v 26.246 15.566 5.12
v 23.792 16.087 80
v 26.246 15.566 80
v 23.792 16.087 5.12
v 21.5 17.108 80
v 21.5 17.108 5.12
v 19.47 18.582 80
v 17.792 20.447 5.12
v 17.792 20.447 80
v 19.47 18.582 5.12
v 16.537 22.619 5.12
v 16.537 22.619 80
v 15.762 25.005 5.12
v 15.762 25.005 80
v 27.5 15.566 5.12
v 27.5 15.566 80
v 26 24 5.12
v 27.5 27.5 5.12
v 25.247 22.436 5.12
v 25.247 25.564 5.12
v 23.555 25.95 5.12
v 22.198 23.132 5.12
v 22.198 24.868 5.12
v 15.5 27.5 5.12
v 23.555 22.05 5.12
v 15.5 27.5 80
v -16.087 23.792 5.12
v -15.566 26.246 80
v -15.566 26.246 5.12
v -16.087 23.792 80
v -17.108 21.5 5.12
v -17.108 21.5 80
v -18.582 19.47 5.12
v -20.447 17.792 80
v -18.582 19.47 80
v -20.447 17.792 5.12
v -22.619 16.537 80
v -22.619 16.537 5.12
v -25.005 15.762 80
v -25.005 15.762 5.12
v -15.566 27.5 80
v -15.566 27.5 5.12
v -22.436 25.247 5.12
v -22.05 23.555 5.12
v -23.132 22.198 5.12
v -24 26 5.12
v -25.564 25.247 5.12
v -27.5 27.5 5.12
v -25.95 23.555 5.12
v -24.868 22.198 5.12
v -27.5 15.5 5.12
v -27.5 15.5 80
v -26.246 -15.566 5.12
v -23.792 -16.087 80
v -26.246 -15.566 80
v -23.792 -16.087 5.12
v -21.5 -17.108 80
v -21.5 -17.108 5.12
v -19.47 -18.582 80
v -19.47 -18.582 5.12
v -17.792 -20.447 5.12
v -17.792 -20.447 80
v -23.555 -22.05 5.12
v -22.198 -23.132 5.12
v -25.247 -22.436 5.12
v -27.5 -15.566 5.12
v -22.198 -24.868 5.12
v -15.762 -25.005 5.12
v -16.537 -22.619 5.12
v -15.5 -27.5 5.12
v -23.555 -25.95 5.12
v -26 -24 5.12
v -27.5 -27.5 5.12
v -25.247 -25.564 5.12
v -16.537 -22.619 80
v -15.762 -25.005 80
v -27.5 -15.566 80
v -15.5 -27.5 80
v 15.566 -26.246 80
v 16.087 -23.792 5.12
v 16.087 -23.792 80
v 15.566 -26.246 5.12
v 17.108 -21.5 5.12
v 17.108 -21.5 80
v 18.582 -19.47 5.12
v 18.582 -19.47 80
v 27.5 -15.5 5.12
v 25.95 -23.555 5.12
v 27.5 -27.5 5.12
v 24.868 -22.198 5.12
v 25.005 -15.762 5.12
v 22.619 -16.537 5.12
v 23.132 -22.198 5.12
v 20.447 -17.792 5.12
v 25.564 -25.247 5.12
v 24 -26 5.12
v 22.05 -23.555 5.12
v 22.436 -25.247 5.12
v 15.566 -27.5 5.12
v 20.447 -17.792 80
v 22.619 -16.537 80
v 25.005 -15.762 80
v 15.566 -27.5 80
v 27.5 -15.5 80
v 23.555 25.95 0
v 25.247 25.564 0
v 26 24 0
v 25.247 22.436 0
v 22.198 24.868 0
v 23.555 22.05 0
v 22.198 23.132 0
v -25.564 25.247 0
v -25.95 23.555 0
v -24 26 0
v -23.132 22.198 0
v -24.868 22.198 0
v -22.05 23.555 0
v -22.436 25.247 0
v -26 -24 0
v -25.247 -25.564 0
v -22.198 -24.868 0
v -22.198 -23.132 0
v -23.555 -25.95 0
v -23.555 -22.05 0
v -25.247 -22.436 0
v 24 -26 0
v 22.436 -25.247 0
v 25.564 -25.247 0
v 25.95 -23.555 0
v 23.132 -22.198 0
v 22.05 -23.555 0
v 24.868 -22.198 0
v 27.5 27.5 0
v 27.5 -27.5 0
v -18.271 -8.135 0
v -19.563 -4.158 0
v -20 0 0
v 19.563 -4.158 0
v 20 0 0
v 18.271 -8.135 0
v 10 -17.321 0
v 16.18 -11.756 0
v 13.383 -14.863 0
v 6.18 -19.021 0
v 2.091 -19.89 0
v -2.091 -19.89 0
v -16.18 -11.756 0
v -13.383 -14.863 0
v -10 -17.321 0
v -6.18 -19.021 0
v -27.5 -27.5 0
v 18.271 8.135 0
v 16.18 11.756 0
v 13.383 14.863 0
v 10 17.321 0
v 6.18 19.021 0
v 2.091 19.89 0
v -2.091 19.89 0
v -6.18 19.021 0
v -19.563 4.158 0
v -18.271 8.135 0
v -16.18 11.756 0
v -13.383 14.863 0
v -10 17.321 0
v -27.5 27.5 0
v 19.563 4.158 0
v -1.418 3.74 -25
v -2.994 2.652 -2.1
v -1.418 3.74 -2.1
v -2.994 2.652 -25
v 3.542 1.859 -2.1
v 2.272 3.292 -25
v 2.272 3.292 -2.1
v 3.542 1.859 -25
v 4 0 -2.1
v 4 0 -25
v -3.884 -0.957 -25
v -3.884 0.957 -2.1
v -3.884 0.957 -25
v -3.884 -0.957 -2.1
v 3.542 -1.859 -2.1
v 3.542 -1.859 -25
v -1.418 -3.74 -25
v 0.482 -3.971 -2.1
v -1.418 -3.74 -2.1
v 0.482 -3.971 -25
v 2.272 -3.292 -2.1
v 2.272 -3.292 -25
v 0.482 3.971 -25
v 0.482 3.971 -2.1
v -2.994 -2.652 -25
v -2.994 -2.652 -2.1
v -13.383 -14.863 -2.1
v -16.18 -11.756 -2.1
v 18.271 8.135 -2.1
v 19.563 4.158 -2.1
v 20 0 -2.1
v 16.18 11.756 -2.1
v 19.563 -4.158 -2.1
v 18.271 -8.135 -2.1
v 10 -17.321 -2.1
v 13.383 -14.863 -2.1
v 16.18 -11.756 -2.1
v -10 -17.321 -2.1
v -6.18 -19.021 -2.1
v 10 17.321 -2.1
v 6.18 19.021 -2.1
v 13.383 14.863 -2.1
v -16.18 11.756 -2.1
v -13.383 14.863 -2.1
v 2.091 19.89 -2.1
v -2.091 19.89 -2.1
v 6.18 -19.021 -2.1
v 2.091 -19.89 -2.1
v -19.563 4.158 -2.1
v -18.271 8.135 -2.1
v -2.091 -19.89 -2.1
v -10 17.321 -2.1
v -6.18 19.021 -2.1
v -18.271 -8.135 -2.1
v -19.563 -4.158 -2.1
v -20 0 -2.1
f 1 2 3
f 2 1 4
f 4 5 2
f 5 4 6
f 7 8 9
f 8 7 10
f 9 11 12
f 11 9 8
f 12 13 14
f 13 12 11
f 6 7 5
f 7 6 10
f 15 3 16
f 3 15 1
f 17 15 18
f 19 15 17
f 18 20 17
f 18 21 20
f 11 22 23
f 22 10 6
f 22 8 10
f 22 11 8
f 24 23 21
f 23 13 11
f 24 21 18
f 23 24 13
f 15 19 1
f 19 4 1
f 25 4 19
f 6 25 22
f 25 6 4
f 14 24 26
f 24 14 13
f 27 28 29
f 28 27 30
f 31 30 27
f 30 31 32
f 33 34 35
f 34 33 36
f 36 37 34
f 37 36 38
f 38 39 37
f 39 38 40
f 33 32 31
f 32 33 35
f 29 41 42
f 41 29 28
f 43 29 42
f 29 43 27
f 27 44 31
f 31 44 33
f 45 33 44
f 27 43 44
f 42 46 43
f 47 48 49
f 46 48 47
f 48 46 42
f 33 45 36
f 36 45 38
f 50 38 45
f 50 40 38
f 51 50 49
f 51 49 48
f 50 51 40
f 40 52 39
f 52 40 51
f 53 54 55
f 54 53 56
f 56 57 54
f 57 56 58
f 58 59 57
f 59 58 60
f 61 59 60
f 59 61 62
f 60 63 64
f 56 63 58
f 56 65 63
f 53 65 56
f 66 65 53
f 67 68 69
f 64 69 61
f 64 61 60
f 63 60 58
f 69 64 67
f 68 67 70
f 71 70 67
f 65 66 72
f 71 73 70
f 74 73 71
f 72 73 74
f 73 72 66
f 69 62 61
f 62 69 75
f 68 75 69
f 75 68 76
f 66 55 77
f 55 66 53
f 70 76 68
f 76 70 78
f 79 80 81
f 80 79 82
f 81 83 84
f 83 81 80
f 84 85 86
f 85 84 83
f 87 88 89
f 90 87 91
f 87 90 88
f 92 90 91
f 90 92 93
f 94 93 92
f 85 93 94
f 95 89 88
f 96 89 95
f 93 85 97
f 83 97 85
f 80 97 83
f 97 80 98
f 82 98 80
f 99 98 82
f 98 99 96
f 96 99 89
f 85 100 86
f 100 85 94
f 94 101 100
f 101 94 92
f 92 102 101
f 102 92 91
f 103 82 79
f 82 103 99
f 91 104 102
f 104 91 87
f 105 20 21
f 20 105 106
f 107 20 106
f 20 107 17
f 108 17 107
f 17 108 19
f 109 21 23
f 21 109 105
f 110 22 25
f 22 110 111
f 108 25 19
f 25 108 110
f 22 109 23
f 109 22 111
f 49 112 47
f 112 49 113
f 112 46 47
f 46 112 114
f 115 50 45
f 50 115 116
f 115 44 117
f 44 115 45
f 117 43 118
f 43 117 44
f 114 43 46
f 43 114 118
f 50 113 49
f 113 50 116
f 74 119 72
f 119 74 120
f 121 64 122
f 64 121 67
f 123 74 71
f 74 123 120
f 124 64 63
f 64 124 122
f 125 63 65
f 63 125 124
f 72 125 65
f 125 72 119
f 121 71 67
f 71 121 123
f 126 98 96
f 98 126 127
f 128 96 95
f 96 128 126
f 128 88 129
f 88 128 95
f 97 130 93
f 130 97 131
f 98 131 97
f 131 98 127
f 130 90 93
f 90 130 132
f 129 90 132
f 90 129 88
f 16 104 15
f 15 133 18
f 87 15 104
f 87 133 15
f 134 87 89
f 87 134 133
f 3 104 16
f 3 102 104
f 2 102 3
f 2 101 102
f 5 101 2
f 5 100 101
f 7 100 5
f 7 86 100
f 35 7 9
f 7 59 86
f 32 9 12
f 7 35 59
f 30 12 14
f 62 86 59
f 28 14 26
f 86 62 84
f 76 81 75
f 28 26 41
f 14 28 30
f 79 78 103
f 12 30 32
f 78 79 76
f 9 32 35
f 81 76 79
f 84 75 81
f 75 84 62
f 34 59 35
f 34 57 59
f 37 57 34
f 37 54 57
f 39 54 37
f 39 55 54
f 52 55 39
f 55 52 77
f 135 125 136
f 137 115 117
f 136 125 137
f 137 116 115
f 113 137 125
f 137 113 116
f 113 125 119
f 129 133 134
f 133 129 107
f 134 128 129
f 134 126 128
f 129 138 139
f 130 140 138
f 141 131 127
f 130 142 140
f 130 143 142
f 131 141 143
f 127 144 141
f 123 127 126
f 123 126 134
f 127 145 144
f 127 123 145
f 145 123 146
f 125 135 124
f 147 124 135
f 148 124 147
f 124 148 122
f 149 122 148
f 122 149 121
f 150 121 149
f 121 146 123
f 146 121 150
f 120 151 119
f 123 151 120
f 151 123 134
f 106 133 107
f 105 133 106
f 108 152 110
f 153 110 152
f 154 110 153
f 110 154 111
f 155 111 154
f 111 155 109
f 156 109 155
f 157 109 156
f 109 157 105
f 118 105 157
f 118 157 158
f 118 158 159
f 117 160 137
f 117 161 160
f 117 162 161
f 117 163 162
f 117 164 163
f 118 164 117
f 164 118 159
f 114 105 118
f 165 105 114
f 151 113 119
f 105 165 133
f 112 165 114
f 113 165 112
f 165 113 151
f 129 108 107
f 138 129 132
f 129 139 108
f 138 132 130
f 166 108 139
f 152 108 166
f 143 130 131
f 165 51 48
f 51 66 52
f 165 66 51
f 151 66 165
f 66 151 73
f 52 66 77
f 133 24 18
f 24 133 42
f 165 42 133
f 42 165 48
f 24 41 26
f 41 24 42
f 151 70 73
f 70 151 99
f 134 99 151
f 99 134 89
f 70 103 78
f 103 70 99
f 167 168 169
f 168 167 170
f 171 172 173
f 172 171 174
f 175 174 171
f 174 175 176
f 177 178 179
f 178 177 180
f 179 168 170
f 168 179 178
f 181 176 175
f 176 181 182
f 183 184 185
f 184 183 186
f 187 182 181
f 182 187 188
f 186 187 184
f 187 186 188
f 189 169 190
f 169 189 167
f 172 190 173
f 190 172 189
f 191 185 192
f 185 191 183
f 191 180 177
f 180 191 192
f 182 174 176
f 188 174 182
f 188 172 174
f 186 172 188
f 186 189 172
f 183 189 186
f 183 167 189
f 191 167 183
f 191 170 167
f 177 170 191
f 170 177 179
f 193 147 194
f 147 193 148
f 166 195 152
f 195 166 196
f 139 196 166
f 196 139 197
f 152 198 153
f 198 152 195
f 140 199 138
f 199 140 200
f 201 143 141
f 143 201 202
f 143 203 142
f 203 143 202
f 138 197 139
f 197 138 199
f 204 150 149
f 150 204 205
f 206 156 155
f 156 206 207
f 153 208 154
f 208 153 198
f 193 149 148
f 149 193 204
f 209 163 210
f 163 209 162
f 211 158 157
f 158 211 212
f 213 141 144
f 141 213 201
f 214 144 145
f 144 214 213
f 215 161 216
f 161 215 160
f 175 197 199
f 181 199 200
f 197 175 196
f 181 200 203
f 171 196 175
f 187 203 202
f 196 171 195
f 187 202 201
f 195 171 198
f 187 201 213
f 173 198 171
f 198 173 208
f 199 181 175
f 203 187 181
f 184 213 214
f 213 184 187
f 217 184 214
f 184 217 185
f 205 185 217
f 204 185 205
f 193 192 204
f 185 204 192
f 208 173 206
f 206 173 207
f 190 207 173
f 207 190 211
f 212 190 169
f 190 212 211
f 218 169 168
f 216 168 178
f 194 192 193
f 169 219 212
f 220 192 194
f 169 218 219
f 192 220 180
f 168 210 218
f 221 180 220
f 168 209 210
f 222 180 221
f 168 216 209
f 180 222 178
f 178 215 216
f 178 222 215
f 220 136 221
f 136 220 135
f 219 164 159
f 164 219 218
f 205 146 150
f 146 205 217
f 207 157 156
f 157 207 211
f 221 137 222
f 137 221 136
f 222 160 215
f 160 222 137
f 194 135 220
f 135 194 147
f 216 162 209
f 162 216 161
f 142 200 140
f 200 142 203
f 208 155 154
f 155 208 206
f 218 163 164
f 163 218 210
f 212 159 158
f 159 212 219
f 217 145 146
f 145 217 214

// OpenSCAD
hole_spacing = 48;
face_dim = 55;
stepper_face = 5.12;
length = 80;
stepper_circle_h = 2.1;
stepper_cicrle_r = 20;
m3_length = 14;
m3_available_length = m3_length - stepper_face;

critical_dim = 5;
critical_face = face_dim + 2 * critical_dim;
m3_nut_flats = 5.9;	// normal M3 hex nut exact width = 5.5
m3_nut_depth = 3;	// normal M3 hex nut exact depth = 2.4, nyloc = 4
m3_head_h = 2;
m3_head_r = 2.65;

module stepper(){

	difference(){
		translate([face_dim * -0.5, face_dim * -0.5, 0])cube([face_dim, face_dim, length]);
		for(i = [0:90:360]){
			rotate([0,0,i]){
				translate([face_dim * 0.5 , face_dim * 0.5, stepper_face]){
					cylinder(r=12, h = length);
				}
			}
		}
		motor_bolt_holes();
	}
	translate([0,0,-25])cylinder(r=4, h=25);
	translate([0,0,-1 * stepper_circle_h])cylinder(h=stepper_circle_h, r=stepper_cicrle_r);
}

module motor_bolt_holes(){
	for(i = [0:90:360]){
		rotate([0,0,i]){
			translate([hole_spacing * 0.5 , hole_spacing * 0.5,-2]){
				cylinder(r=2, h = 15);
			}
		}
	}
}

module motor_bolts(){
	color([0,0,1])
	for(i = [0:90:360]){
		rotate([0,0,i]){
			translate([hole_spacing * 0.5 , hole_spacing * 0.5,0]){
				//translate([0,0,m3_length])cylinder(r = m3_head_r, h = m3_head_h);
				//cylinder(r=1.8, h = m3_length);
				translate([0,0,0.5 * m3_nut_depth])hexagon(m3_nut_flats, m3_nut_depth);
			}
		}
	}
}


module cable_space(){
	hull(){
		translate([0,0,-20])cylinder(r=16, h=20);
		translate([0,-30,-20])cylinder(r=16, h=20);
	}
}

module mount(){
	
	union(){
		translate([critical_face * -0.5, critical_face * -0.5, 0])cube([critical_face, critical_face, m3_available_length]);
		translate([-0.5 * critical_face, -0.5 * critical_face,0])difference(){
			cube([critical_dim, critical_face, length + critical_dim]);
			#translate([-1,critical_dim,m3_available_length])cube([10,10,13]);
		}
		translate([-0.8 * critical_face, -0.5 * critical_face, 0])cube([critical_face * 1.5, critical_dim, length + critical_dim]);
		translate([-0.5 * critical_face, -0.5 * critical_face, 25])rotate([0,180,0])triangle(critical_face * 0.3,critical_face * 0.8, critical_dim);
		translate([-0.5 * critical_face, -0.5 * critical_face, length - 18 - critical_dim])rotate([0,180,0])triangle(critical_face * 0.3,critical_face * 0.8, critical_dim);
	}
	
	
}

module mounting(){
	color([0,1,0])
	translate([0,critical_face * -0.5 + 8, 0]){
		rotate([90,0,0]){
			translate([critical_face * 0.58, 10,0])cylinder(h=10, r = 3);
			translate([critical_face * 0.58, length - 8,0])cylinder(h=10, r = 3);
			translate([critical_face * -0.65, 10,0])cylinder(h=10, r = 3);
			translate([critical_face * -0.65, length - 8,0])cylinder(h=10, r = 3);			
		}
	}
}

module triangle(h,b,w){
	linear_extrude(height = w, center = true, convexity = 10, twist = 0)
	polygon(points=[[0,0],[h,0],[0,b]], paths=[[0,1,2]]);
}

module hexagon(size, height) {
	boxWidth = size/1.75;
	rotate([0,0,90])
	for (r = [-60, 0, 60]) rotate([0,0,r]) cube([boxWidth, size, height], true);
}

/*

rotate([90,0,0])
{
	union(){
		//color([0.5,0.5,0.5])translate([0,0,m3_available_length])stepper();
		//color([0,0,1])motor_bolts();
		difference(){
			mount();
			mounting();
			translate([0,0, m3_available_length])cable_space();
			motor_bolt_holes();
			motor_bolts();
			translate([0,0, m3_available_length])stepper();
		}
	}
}

*/

stepper();
